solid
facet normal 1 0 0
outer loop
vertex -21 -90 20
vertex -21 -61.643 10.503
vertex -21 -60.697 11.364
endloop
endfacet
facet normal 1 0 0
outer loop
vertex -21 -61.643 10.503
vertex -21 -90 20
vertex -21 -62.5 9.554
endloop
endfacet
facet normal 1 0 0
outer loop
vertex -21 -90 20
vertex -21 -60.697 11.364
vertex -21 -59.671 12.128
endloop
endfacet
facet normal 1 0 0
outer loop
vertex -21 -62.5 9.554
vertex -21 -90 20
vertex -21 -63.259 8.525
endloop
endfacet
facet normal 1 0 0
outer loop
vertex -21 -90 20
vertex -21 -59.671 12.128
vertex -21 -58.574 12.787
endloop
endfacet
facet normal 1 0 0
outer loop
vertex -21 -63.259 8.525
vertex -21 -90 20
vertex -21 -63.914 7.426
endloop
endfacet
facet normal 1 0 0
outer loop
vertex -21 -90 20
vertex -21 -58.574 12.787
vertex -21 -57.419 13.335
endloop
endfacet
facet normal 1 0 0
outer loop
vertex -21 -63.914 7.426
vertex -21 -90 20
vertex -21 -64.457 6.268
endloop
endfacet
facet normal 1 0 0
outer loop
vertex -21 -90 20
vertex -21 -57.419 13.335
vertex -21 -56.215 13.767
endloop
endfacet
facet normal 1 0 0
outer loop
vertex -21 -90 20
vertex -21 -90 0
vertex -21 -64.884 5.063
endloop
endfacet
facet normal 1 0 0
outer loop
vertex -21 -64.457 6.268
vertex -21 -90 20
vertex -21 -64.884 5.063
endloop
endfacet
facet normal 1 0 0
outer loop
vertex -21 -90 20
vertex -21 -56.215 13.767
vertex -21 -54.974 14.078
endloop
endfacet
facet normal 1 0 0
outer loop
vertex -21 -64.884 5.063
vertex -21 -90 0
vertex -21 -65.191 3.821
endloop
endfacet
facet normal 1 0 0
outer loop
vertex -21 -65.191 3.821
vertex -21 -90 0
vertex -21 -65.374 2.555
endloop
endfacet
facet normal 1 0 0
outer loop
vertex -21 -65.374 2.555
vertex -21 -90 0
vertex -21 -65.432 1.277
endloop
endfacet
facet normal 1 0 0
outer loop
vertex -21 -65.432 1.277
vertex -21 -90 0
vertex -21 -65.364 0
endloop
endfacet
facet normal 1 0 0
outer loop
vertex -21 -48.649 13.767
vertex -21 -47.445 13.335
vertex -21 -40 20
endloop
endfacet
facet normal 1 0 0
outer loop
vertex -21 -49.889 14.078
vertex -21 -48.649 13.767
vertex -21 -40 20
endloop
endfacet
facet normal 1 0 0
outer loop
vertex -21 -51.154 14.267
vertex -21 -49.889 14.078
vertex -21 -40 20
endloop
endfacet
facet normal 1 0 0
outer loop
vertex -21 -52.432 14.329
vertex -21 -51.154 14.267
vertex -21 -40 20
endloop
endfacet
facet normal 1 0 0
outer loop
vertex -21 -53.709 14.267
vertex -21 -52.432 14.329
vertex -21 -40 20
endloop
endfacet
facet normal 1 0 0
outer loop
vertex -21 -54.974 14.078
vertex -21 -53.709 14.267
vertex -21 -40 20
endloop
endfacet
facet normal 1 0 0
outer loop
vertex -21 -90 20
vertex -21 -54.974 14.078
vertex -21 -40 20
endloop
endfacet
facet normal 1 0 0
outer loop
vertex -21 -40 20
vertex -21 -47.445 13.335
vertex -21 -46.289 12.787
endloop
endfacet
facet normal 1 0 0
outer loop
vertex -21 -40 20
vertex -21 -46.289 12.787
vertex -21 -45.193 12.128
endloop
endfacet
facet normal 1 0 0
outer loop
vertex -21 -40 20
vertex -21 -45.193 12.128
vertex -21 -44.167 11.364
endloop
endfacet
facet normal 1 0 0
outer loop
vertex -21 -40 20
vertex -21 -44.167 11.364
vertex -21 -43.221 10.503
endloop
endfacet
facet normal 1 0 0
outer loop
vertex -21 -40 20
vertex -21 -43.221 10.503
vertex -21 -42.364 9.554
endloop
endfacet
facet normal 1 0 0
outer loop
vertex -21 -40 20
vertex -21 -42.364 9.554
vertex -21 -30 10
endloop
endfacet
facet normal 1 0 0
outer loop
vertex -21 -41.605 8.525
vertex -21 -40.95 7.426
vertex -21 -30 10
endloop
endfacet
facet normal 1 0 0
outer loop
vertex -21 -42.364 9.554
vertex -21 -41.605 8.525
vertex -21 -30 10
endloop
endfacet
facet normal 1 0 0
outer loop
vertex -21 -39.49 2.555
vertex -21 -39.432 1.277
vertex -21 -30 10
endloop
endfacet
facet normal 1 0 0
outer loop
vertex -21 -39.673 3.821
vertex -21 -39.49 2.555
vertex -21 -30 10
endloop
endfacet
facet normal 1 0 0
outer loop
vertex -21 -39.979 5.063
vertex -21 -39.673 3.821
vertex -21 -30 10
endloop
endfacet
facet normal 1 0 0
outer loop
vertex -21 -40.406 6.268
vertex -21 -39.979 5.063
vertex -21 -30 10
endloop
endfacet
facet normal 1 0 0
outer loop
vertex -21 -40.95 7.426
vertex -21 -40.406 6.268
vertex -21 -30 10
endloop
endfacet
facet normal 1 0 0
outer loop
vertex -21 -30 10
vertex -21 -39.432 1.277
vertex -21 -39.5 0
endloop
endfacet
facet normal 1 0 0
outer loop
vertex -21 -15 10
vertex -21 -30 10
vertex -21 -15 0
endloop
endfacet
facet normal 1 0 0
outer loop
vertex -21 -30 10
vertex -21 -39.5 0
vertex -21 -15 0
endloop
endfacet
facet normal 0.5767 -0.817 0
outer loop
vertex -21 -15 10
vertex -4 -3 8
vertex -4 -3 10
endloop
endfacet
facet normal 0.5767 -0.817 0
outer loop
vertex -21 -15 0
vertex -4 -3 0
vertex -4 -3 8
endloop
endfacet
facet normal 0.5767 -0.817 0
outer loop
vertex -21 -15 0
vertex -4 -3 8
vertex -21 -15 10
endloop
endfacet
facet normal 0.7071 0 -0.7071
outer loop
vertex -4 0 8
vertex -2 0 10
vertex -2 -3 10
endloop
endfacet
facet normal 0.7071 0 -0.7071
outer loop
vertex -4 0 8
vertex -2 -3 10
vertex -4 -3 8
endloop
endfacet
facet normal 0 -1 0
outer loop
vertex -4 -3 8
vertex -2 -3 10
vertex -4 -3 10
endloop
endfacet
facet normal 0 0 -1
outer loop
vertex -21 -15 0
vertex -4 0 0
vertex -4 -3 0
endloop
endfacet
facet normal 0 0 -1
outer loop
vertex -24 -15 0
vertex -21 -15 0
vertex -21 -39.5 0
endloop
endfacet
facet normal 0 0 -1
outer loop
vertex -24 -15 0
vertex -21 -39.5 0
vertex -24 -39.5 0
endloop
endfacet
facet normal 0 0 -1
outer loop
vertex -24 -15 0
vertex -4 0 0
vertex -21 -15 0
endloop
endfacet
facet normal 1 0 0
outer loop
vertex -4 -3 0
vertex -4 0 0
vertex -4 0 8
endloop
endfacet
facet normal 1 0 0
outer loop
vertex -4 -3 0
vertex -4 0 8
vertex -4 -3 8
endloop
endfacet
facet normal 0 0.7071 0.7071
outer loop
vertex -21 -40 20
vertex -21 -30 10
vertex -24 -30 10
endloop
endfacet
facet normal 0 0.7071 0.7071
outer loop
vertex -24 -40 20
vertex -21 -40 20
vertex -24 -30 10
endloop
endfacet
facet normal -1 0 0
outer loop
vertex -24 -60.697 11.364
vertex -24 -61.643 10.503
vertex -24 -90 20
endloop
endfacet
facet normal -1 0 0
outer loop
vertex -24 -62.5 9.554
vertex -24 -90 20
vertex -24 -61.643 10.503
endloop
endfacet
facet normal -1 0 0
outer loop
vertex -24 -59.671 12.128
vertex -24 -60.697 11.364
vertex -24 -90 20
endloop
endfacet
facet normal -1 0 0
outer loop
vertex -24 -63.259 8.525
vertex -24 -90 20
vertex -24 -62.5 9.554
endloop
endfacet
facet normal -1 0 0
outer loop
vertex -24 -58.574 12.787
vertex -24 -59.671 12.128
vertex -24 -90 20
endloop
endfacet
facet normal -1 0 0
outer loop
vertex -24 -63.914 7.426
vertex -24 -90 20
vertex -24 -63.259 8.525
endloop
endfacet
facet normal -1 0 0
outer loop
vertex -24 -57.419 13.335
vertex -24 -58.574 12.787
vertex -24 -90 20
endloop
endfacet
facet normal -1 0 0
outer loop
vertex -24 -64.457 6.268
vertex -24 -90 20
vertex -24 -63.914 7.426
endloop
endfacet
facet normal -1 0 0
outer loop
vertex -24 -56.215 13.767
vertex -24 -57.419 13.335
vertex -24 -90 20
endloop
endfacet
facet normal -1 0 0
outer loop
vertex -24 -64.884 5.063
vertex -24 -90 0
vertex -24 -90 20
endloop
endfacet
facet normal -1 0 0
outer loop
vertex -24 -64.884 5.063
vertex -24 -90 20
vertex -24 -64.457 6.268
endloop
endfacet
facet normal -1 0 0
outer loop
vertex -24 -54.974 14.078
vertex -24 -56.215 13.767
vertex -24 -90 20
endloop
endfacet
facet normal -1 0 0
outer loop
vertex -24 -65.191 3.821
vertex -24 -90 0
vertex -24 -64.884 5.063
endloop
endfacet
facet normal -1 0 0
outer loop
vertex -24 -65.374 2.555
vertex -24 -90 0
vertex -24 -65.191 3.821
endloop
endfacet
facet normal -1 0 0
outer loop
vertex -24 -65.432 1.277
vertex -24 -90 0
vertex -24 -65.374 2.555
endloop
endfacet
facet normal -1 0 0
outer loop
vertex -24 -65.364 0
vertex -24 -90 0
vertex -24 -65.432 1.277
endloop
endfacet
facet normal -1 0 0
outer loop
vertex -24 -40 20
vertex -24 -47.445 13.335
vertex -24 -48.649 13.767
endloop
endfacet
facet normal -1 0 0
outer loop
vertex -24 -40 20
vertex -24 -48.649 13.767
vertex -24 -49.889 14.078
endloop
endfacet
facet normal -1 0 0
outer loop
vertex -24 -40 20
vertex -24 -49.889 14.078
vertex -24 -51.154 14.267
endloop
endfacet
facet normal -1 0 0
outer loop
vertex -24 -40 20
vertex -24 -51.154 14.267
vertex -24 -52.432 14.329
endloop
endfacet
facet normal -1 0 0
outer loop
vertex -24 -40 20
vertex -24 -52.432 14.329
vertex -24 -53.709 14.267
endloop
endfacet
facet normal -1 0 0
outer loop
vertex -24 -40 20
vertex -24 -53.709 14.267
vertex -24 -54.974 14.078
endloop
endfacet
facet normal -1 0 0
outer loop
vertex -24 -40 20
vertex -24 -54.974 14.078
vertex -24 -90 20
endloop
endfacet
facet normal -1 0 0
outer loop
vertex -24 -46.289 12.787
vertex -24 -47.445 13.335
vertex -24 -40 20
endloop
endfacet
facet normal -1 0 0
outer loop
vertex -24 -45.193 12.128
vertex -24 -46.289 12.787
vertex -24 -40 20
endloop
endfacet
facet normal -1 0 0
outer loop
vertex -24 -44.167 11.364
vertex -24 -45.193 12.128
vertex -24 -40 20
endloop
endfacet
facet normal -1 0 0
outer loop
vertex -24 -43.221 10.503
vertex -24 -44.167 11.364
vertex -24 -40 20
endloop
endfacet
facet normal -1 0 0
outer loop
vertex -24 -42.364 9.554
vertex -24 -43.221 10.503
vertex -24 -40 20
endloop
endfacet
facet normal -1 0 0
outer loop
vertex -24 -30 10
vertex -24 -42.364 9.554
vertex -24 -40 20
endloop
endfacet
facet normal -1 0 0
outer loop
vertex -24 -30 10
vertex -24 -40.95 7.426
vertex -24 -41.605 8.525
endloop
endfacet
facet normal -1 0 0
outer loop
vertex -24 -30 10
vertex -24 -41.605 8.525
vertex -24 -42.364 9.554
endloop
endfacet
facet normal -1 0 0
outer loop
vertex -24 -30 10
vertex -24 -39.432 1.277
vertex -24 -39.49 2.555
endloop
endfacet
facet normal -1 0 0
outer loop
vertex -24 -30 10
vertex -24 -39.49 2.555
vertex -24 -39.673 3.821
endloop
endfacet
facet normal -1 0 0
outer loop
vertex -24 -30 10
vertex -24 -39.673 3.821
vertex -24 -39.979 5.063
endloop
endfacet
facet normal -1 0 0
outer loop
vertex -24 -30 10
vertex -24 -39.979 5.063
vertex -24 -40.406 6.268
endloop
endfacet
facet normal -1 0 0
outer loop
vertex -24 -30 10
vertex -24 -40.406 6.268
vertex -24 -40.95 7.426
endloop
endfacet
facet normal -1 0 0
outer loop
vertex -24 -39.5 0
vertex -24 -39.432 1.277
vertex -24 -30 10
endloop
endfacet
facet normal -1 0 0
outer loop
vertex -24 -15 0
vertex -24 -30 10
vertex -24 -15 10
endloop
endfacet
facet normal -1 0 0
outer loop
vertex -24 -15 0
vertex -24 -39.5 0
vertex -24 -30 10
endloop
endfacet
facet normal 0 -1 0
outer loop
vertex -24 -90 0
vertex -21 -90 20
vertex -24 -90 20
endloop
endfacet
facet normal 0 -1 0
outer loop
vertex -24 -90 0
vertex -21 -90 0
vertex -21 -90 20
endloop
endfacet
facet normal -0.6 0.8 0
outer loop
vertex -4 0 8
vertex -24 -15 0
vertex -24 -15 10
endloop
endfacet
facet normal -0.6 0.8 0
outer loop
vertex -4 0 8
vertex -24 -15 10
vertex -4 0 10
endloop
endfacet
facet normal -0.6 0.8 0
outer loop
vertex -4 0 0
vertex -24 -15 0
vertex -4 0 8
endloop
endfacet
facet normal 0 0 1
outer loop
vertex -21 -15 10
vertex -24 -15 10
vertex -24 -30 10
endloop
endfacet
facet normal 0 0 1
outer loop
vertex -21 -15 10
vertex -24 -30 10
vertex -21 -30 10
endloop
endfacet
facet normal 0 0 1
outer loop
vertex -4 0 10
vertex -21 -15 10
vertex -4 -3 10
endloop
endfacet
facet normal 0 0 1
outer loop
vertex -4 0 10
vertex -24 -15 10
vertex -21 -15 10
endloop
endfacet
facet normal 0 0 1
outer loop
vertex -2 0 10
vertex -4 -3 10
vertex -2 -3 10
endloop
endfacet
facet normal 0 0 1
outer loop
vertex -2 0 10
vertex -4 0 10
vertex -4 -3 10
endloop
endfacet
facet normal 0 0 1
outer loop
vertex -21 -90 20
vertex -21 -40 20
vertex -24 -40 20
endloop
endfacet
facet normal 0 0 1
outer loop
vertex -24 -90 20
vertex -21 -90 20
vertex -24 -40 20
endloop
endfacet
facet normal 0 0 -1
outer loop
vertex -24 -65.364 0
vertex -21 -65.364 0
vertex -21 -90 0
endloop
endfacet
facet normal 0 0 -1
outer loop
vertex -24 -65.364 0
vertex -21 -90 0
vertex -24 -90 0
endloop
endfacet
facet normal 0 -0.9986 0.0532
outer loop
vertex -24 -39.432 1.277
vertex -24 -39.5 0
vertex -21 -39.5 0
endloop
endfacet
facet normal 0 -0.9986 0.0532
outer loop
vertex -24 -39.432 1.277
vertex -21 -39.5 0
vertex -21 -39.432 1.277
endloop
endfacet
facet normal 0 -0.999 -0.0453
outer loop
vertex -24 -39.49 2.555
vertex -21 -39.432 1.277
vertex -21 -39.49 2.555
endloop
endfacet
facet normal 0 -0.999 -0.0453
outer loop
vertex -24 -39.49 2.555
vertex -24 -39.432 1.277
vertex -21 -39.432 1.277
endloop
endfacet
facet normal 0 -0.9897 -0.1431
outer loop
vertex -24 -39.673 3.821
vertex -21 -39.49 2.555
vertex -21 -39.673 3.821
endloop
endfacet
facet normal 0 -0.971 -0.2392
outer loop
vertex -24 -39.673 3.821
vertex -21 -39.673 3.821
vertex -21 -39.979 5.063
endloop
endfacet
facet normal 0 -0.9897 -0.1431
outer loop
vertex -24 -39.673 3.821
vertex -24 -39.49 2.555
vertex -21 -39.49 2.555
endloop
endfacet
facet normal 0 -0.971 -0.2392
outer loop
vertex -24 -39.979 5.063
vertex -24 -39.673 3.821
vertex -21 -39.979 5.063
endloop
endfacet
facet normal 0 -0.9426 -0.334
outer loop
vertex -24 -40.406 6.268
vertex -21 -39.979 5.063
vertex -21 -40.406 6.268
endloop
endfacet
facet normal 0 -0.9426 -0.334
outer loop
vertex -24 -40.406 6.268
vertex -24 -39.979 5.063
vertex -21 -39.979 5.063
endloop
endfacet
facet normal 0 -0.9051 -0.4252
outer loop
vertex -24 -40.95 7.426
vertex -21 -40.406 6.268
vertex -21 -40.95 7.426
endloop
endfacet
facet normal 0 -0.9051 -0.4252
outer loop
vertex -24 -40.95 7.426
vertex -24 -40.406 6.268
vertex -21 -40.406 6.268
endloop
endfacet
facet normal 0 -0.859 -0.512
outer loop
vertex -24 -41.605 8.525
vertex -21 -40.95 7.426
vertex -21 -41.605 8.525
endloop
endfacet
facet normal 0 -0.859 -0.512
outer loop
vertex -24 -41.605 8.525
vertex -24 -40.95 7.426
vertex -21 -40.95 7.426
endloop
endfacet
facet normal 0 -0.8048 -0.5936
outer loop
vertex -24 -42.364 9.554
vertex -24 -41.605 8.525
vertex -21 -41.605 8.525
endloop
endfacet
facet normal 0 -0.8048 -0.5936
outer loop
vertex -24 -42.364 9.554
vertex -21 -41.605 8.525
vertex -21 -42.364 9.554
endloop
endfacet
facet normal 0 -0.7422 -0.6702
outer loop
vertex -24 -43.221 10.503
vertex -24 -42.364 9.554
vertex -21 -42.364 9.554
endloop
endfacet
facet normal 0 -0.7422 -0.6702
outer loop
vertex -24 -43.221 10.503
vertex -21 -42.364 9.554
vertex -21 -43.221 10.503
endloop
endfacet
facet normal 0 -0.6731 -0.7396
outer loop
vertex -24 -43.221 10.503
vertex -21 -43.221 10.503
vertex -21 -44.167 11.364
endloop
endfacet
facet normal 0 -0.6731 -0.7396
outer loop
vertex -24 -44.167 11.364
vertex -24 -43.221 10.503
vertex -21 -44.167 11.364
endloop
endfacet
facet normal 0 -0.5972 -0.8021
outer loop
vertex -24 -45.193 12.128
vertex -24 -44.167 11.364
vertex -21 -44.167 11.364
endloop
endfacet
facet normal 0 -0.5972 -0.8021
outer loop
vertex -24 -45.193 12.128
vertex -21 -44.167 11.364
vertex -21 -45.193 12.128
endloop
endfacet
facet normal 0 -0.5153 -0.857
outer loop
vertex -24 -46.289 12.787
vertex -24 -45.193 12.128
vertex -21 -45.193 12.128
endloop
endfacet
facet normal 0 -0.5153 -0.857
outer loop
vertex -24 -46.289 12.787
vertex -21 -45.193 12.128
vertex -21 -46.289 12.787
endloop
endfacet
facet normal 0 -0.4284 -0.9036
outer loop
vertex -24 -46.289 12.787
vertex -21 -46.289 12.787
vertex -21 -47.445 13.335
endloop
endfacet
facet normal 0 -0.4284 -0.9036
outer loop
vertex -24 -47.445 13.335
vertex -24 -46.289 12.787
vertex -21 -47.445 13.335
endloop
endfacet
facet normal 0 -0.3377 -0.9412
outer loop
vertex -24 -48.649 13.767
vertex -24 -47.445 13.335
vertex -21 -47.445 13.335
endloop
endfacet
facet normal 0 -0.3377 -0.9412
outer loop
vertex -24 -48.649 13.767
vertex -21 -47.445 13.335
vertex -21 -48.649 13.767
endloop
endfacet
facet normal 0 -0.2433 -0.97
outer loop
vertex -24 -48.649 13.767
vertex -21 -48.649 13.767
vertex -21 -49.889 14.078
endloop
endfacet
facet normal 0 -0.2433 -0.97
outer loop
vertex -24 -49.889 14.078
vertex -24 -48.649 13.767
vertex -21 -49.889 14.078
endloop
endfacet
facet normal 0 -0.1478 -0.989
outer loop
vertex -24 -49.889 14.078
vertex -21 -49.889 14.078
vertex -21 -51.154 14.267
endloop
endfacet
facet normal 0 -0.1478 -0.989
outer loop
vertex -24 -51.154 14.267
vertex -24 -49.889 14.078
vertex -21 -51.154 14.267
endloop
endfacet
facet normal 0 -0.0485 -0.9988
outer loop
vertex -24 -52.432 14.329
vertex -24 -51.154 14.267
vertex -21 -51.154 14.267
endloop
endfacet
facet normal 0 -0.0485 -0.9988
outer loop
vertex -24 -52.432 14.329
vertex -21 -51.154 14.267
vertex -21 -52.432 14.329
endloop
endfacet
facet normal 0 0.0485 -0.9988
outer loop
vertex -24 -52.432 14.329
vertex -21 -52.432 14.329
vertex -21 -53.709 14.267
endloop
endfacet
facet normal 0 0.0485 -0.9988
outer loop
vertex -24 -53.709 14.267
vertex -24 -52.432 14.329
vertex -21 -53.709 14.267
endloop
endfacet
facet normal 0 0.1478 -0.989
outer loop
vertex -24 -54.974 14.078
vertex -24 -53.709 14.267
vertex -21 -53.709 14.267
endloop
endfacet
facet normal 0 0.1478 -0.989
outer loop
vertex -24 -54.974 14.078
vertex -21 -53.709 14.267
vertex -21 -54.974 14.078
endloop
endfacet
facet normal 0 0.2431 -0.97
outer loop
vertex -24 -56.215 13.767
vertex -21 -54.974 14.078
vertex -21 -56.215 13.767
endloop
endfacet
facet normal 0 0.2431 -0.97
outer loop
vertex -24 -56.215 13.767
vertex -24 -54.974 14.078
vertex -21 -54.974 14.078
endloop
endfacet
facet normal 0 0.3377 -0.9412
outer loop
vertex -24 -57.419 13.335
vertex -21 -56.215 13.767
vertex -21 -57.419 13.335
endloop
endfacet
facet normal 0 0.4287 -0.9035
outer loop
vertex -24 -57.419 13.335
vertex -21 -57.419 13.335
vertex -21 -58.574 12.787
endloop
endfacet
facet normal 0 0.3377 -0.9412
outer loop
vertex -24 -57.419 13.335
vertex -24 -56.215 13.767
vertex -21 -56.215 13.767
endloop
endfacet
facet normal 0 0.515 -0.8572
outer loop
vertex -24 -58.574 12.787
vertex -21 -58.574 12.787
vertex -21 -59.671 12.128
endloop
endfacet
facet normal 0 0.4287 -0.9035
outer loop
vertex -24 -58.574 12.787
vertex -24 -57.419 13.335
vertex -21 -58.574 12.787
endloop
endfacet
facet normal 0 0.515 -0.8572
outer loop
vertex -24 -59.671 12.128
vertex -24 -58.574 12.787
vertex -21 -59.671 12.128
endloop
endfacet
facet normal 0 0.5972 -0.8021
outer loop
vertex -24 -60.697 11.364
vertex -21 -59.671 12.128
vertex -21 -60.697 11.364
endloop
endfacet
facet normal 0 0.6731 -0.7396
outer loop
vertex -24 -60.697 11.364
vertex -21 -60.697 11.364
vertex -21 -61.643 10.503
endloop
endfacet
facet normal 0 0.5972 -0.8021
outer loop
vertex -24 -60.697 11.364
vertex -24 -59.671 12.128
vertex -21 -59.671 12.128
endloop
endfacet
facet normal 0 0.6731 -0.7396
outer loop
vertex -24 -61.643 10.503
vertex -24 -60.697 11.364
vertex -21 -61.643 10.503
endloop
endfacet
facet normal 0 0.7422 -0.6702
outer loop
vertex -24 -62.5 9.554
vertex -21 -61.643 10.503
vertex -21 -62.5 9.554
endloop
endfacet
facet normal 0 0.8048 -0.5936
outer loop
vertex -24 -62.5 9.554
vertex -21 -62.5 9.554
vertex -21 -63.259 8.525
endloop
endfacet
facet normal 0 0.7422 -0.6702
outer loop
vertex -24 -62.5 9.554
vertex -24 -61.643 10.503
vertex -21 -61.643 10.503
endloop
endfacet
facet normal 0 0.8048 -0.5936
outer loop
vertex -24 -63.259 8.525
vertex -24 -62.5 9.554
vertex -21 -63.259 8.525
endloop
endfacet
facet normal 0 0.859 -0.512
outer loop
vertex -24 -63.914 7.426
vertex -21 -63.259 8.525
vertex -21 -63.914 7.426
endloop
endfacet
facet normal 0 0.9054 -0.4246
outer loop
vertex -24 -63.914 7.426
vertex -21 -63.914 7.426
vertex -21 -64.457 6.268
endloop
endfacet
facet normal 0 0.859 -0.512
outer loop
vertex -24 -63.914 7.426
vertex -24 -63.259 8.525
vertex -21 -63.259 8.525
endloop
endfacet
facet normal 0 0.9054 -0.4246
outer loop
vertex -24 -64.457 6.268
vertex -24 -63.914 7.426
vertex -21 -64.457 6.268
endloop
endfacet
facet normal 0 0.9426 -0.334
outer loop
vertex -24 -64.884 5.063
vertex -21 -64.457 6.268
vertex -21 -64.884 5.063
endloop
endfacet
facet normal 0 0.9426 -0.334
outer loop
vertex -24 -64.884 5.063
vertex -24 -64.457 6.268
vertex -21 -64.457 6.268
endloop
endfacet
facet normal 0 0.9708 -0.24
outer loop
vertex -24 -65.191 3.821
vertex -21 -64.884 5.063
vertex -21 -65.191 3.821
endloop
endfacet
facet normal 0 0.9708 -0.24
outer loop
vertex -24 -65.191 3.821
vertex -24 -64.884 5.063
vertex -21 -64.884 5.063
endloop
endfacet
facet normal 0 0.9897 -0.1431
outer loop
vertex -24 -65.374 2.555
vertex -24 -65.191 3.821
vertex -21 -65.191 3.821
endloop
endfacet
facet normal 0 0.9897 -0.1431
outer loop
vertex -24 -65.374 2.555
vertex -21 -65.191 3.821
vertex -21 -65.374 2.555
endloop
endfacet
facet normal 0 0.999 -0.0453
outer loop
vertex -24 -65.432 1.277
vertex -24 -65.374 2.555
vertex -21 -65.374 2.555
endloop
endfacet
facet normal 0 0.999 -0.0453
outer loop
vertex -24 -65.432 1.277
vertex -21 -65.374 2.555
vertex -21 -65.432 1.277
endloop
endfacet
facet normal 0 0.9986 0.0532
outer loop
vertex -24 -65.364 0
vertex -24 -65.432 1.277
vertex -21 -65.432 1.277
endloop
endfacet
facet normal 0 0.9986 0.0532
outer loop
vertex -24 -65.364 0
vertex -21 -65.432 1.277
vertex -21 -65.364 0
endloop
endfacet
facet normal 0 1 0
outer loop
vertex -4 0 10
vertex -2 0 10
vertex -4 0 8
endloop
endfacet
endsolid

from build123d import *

# Parameters (mm, degrees)
F1_DEPTH = 10
F3_DEPTH = 3
F4_W     = 3
F4_H     = 60
F5_DEPTH = 10
F6_SIZE  = 9.99999
F8_DEPTH = 25


# Not quite as in the source:
# - a fillet or chamfer is up to 0.001 mm smaller than in the source, because OpenCascade refuses the exact size


with BuildPart() as f1:
    # F0 (on Top) → F1 (new body)
    with BuildSketch(Plane.XY):
        Polygon((20, -15), (0, 0), (0, -3), (17, -15), (17, -90), (20, -90), align=None)
    extrude(amount=F1_DEPTH)

    # F2 (on Front) → F3 (join)
    with BuildSketch(Plane.XZ):
        Polygon((0, 8), (0, 10), (-2, 10), align=None)
    extrude(amount=F3_DEPTH)

    # F4 (on face) → F5 (join)
    with BuildSketch(Plane.XY.offset(10)):
        with Locations((18.5, -60)):
            Rectangle(F4_W, F4_H)
    extrude(amount=F5_DEPTH)

    # F6 (size 10 in the source; OpenCascade refuses exactly that, so slightly less here)
    f6_edges = [f1.edges().sort_by_distance(p)[0] for p in [
        (18.5, -30, 20),
    ]]
    chamfer(f6_edges, length=F6_SIZE)

    # F7 (on face) → F8 (cut)
    with BuildSketch(Plane.YZ.offset(20)):
        with BuildLine():
            Line((-65.3636879024, 0), (-39.5, 0))
            ThreePointArc((-39.5, 0), (-52.4318439512, 14.3294404922), (-65.3636879024, 0))
        make_face()
    extrude(amount=-F8_DEPTH, mode=Mode.SUBTRACT)


with BuildPart() as f10_1:
    # F10: instance of F1
    add(f1.part.mirror(Plane.YZ.offset(-2)))


solid = f10_1.part
